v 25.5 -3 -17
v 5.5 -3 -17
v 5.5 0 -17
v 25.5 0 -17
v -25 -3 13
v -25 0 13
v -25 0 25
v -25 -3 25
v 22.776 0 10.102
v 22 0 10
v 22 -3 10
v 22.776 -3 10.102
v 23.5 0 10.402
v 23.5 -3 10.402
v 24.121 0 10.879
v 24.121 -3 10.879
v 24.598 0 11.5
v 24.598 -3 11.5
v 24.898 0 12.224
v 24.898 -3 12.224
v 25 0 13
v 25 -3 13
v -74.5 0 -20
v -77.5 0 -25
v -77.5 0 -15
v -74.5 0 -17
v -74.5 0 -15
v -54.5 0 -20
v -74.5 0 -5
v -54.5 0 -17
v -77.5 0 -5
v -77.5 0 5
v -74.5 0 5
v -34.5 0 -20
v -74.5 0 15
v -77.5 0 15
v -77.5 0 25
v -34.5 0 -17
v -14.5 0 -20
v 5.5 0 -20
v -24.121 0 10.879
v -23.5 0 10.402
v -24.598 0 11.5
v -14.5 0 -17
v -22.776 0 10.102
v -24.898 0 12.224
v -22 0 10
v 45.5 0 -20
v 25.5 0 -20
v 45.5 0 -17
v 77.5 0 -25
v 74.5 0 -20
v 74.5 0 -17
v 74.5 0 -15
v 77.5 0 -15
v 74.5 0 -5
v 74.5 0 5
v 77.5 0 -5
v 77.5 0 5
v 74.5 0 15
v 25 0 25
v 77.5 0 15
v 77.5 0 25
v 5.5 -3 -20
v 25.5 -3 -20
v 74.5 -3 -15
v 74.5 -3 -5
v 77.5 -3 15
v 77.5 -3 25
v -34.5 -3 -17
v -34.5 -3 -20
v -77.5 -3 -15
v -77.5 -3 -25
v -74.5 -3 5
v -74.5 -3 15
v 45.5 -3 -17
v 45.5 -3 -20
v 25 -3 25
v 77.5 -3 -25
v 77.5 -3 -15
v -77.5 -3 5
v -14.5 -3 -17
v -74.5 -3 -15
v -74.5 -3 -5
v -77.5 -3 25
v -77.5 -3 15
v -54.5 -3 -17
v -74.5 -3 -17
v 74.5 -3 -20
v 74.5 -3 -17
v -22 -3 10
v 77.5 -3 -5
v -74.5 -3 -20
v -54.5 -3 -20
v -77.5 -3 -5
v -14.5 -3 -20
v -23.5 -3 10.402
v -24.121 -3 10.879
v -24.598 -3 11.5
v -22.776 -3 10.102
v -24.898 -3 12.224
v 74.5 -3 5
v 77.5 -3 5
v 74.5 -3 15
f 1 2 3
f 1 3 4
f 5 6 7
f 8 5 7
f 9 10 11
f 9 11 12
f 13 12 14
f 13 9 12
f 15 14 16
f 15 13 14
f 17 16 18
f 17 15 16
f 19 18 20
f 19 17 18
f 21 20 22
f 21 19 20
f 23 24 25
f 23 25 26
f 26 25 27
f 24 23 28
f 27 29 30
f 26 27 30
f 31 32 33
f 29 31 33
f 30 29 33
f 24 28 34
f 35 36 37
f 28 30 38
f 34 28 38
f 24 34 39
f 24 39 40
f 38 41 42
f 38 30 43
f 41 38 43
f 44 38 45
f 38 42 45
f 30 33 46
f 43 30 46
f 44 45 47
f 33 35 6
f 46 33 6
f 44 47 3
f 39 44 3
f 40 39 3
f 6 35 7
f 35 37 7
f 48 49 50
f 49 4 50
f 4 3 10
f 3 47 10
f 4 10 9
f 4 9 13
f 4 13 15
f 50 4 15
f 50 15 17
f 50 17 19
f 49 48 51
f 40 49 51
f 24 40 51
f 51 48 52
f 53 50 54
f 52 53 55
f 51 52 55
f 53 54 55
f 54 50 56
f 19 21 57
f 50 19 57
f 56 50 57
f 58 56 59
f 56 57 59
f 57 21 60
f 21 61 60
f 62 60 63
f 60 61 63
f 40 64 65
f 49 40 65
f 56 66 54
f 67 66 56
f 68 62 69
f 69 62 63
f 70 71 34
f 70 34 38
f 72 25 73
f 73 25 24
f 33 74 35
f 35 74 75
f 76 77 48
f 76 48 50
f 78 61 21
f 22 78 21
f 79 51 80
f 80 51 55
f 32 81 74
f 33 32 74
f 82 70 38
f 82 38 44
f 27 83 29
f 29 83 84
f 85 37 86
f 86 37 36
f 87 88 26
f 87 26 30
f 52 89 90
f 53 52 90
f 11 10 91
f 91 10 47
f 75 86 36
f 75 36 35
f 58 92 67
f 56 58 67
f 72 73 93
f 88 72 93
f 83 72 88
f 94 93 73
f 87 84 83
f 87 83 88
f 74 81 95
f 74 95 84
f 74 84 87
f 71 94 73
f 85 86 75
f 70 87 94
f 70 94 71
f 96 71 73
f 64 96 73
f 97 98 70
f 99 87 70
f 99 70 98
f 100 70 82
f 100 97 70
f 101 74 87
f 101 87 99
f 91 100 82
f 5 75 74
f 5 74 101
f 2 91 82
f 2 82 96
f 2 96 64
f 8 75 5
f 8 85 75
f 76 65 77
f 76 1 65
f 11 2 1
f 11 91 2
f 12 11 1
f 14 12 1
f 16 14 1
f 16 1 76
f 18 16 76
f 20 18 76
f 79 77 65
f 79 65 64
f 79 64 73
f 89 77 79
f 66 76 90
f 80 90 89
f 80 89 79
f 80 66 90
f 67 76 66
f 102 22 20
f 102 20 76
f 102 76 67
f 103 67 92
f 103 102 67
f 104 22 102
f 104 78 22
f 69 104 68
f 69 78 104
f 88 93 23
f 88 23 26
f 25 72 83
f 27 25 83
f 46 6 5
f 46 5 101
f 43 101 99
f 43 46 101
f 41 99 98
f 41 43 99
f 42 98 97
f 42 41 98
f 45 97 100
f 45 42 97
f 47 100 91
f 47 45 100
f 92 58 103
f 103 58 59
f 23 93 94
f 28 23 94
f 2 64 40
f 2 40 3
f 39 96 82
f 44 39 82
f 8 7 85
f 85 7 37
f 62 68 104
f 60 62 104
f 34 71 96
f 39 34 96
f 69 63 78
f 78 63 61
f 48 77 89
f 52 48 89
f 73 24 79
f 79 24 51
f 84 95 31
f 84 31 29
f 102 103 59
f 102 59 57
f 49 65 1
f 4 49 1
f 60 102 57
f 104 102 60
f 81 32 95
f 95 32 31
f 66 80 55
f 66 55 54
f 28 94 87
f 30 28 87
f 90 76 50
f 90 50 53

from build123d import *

# Parameters (mm, degrees)
PAD_DEPTH       = 3
SKETCH001_W     = 20
SKETCH001_H     = 3
SKETCH001_W_2   = 29
POCKET_DEPTH    = 3.001
SKETCH002_W     = 3
SKETCH002_H     = 10
POCKET001_DEPTH = 328.786205


with BuildPart() as part:
    # Sketch → Pad (new body)
    with BuildSketch(Plane.XZ):
        with BuildLine():
            Line((-77.5, -25), (77.5, -25))
            Line((77.5, -25), (77.5, 25))
            Line((77.5, 25), (25, 25))
            Line((25, 25), (25, 13))
            ThreePointArc((22, 10), (24.12132, 10.87868), (25, 13))
            Line((22, 10), (-22, 10))
            ThreePointArc((-25, 13), (-24.12132, 10.87868), (-22, 10))
            Line((-25, 13), (-25, 25))
            Line((-25, 25), (-77.5, 25))
            Line((-77.5, 25), (-77.5, -25))
        make_face()
    extrude(amount=PAD_DEPTH)

    # Sketch001 (on Face12 of Pad) → Pocket (cut, through all)
    with BuildSketch(Plane.XZ.offset(3)):
        with Locations((-64.5, -18.5)):
            Rectangle(SKETCH001_W, SKETCH001_H)
        with Locations((-24.5, -18.5)):
            Rectangle(SKETCH001_W, SKETCH001_H)
        with Locations((15.5, -18.5)):
            Rectangle(SKETCH001_W, SKETCH001_H)
        with Locations((60, -18.5)):
            Rectangle(SKETCH001_W_2, SKETCH001_H)
    extrude(amount=-POCKET_DEPTH, mode=Mode.SUBTRACT)

    # Sketch002 (on Face5 of Pocket) → Pocket001 (cut, through all)
    with BuildSketch(Plane.XZ.offset(3)):
        with Locations((-76, 10)):
            Rectangle(SKETCH002_W, SKETCH002_H)
        with Locations((-76, -10)):
            Rectangle(SKETCH002_W, SKETCH002_H)
    pocket001 = extrude(amount=-POCKET001_DEPTH, mode=Mode.SUBTRACT)

    # Mirrored: Pocket001 across Sketch002 V_Axis
    add(pocket001.mirror(Plane(origin=(0, -3, 0), x_dir=(0, -1, 0), z_dir=(1, 0, 0))), mode=Mode.SUBTRACT)


solid = part.part
